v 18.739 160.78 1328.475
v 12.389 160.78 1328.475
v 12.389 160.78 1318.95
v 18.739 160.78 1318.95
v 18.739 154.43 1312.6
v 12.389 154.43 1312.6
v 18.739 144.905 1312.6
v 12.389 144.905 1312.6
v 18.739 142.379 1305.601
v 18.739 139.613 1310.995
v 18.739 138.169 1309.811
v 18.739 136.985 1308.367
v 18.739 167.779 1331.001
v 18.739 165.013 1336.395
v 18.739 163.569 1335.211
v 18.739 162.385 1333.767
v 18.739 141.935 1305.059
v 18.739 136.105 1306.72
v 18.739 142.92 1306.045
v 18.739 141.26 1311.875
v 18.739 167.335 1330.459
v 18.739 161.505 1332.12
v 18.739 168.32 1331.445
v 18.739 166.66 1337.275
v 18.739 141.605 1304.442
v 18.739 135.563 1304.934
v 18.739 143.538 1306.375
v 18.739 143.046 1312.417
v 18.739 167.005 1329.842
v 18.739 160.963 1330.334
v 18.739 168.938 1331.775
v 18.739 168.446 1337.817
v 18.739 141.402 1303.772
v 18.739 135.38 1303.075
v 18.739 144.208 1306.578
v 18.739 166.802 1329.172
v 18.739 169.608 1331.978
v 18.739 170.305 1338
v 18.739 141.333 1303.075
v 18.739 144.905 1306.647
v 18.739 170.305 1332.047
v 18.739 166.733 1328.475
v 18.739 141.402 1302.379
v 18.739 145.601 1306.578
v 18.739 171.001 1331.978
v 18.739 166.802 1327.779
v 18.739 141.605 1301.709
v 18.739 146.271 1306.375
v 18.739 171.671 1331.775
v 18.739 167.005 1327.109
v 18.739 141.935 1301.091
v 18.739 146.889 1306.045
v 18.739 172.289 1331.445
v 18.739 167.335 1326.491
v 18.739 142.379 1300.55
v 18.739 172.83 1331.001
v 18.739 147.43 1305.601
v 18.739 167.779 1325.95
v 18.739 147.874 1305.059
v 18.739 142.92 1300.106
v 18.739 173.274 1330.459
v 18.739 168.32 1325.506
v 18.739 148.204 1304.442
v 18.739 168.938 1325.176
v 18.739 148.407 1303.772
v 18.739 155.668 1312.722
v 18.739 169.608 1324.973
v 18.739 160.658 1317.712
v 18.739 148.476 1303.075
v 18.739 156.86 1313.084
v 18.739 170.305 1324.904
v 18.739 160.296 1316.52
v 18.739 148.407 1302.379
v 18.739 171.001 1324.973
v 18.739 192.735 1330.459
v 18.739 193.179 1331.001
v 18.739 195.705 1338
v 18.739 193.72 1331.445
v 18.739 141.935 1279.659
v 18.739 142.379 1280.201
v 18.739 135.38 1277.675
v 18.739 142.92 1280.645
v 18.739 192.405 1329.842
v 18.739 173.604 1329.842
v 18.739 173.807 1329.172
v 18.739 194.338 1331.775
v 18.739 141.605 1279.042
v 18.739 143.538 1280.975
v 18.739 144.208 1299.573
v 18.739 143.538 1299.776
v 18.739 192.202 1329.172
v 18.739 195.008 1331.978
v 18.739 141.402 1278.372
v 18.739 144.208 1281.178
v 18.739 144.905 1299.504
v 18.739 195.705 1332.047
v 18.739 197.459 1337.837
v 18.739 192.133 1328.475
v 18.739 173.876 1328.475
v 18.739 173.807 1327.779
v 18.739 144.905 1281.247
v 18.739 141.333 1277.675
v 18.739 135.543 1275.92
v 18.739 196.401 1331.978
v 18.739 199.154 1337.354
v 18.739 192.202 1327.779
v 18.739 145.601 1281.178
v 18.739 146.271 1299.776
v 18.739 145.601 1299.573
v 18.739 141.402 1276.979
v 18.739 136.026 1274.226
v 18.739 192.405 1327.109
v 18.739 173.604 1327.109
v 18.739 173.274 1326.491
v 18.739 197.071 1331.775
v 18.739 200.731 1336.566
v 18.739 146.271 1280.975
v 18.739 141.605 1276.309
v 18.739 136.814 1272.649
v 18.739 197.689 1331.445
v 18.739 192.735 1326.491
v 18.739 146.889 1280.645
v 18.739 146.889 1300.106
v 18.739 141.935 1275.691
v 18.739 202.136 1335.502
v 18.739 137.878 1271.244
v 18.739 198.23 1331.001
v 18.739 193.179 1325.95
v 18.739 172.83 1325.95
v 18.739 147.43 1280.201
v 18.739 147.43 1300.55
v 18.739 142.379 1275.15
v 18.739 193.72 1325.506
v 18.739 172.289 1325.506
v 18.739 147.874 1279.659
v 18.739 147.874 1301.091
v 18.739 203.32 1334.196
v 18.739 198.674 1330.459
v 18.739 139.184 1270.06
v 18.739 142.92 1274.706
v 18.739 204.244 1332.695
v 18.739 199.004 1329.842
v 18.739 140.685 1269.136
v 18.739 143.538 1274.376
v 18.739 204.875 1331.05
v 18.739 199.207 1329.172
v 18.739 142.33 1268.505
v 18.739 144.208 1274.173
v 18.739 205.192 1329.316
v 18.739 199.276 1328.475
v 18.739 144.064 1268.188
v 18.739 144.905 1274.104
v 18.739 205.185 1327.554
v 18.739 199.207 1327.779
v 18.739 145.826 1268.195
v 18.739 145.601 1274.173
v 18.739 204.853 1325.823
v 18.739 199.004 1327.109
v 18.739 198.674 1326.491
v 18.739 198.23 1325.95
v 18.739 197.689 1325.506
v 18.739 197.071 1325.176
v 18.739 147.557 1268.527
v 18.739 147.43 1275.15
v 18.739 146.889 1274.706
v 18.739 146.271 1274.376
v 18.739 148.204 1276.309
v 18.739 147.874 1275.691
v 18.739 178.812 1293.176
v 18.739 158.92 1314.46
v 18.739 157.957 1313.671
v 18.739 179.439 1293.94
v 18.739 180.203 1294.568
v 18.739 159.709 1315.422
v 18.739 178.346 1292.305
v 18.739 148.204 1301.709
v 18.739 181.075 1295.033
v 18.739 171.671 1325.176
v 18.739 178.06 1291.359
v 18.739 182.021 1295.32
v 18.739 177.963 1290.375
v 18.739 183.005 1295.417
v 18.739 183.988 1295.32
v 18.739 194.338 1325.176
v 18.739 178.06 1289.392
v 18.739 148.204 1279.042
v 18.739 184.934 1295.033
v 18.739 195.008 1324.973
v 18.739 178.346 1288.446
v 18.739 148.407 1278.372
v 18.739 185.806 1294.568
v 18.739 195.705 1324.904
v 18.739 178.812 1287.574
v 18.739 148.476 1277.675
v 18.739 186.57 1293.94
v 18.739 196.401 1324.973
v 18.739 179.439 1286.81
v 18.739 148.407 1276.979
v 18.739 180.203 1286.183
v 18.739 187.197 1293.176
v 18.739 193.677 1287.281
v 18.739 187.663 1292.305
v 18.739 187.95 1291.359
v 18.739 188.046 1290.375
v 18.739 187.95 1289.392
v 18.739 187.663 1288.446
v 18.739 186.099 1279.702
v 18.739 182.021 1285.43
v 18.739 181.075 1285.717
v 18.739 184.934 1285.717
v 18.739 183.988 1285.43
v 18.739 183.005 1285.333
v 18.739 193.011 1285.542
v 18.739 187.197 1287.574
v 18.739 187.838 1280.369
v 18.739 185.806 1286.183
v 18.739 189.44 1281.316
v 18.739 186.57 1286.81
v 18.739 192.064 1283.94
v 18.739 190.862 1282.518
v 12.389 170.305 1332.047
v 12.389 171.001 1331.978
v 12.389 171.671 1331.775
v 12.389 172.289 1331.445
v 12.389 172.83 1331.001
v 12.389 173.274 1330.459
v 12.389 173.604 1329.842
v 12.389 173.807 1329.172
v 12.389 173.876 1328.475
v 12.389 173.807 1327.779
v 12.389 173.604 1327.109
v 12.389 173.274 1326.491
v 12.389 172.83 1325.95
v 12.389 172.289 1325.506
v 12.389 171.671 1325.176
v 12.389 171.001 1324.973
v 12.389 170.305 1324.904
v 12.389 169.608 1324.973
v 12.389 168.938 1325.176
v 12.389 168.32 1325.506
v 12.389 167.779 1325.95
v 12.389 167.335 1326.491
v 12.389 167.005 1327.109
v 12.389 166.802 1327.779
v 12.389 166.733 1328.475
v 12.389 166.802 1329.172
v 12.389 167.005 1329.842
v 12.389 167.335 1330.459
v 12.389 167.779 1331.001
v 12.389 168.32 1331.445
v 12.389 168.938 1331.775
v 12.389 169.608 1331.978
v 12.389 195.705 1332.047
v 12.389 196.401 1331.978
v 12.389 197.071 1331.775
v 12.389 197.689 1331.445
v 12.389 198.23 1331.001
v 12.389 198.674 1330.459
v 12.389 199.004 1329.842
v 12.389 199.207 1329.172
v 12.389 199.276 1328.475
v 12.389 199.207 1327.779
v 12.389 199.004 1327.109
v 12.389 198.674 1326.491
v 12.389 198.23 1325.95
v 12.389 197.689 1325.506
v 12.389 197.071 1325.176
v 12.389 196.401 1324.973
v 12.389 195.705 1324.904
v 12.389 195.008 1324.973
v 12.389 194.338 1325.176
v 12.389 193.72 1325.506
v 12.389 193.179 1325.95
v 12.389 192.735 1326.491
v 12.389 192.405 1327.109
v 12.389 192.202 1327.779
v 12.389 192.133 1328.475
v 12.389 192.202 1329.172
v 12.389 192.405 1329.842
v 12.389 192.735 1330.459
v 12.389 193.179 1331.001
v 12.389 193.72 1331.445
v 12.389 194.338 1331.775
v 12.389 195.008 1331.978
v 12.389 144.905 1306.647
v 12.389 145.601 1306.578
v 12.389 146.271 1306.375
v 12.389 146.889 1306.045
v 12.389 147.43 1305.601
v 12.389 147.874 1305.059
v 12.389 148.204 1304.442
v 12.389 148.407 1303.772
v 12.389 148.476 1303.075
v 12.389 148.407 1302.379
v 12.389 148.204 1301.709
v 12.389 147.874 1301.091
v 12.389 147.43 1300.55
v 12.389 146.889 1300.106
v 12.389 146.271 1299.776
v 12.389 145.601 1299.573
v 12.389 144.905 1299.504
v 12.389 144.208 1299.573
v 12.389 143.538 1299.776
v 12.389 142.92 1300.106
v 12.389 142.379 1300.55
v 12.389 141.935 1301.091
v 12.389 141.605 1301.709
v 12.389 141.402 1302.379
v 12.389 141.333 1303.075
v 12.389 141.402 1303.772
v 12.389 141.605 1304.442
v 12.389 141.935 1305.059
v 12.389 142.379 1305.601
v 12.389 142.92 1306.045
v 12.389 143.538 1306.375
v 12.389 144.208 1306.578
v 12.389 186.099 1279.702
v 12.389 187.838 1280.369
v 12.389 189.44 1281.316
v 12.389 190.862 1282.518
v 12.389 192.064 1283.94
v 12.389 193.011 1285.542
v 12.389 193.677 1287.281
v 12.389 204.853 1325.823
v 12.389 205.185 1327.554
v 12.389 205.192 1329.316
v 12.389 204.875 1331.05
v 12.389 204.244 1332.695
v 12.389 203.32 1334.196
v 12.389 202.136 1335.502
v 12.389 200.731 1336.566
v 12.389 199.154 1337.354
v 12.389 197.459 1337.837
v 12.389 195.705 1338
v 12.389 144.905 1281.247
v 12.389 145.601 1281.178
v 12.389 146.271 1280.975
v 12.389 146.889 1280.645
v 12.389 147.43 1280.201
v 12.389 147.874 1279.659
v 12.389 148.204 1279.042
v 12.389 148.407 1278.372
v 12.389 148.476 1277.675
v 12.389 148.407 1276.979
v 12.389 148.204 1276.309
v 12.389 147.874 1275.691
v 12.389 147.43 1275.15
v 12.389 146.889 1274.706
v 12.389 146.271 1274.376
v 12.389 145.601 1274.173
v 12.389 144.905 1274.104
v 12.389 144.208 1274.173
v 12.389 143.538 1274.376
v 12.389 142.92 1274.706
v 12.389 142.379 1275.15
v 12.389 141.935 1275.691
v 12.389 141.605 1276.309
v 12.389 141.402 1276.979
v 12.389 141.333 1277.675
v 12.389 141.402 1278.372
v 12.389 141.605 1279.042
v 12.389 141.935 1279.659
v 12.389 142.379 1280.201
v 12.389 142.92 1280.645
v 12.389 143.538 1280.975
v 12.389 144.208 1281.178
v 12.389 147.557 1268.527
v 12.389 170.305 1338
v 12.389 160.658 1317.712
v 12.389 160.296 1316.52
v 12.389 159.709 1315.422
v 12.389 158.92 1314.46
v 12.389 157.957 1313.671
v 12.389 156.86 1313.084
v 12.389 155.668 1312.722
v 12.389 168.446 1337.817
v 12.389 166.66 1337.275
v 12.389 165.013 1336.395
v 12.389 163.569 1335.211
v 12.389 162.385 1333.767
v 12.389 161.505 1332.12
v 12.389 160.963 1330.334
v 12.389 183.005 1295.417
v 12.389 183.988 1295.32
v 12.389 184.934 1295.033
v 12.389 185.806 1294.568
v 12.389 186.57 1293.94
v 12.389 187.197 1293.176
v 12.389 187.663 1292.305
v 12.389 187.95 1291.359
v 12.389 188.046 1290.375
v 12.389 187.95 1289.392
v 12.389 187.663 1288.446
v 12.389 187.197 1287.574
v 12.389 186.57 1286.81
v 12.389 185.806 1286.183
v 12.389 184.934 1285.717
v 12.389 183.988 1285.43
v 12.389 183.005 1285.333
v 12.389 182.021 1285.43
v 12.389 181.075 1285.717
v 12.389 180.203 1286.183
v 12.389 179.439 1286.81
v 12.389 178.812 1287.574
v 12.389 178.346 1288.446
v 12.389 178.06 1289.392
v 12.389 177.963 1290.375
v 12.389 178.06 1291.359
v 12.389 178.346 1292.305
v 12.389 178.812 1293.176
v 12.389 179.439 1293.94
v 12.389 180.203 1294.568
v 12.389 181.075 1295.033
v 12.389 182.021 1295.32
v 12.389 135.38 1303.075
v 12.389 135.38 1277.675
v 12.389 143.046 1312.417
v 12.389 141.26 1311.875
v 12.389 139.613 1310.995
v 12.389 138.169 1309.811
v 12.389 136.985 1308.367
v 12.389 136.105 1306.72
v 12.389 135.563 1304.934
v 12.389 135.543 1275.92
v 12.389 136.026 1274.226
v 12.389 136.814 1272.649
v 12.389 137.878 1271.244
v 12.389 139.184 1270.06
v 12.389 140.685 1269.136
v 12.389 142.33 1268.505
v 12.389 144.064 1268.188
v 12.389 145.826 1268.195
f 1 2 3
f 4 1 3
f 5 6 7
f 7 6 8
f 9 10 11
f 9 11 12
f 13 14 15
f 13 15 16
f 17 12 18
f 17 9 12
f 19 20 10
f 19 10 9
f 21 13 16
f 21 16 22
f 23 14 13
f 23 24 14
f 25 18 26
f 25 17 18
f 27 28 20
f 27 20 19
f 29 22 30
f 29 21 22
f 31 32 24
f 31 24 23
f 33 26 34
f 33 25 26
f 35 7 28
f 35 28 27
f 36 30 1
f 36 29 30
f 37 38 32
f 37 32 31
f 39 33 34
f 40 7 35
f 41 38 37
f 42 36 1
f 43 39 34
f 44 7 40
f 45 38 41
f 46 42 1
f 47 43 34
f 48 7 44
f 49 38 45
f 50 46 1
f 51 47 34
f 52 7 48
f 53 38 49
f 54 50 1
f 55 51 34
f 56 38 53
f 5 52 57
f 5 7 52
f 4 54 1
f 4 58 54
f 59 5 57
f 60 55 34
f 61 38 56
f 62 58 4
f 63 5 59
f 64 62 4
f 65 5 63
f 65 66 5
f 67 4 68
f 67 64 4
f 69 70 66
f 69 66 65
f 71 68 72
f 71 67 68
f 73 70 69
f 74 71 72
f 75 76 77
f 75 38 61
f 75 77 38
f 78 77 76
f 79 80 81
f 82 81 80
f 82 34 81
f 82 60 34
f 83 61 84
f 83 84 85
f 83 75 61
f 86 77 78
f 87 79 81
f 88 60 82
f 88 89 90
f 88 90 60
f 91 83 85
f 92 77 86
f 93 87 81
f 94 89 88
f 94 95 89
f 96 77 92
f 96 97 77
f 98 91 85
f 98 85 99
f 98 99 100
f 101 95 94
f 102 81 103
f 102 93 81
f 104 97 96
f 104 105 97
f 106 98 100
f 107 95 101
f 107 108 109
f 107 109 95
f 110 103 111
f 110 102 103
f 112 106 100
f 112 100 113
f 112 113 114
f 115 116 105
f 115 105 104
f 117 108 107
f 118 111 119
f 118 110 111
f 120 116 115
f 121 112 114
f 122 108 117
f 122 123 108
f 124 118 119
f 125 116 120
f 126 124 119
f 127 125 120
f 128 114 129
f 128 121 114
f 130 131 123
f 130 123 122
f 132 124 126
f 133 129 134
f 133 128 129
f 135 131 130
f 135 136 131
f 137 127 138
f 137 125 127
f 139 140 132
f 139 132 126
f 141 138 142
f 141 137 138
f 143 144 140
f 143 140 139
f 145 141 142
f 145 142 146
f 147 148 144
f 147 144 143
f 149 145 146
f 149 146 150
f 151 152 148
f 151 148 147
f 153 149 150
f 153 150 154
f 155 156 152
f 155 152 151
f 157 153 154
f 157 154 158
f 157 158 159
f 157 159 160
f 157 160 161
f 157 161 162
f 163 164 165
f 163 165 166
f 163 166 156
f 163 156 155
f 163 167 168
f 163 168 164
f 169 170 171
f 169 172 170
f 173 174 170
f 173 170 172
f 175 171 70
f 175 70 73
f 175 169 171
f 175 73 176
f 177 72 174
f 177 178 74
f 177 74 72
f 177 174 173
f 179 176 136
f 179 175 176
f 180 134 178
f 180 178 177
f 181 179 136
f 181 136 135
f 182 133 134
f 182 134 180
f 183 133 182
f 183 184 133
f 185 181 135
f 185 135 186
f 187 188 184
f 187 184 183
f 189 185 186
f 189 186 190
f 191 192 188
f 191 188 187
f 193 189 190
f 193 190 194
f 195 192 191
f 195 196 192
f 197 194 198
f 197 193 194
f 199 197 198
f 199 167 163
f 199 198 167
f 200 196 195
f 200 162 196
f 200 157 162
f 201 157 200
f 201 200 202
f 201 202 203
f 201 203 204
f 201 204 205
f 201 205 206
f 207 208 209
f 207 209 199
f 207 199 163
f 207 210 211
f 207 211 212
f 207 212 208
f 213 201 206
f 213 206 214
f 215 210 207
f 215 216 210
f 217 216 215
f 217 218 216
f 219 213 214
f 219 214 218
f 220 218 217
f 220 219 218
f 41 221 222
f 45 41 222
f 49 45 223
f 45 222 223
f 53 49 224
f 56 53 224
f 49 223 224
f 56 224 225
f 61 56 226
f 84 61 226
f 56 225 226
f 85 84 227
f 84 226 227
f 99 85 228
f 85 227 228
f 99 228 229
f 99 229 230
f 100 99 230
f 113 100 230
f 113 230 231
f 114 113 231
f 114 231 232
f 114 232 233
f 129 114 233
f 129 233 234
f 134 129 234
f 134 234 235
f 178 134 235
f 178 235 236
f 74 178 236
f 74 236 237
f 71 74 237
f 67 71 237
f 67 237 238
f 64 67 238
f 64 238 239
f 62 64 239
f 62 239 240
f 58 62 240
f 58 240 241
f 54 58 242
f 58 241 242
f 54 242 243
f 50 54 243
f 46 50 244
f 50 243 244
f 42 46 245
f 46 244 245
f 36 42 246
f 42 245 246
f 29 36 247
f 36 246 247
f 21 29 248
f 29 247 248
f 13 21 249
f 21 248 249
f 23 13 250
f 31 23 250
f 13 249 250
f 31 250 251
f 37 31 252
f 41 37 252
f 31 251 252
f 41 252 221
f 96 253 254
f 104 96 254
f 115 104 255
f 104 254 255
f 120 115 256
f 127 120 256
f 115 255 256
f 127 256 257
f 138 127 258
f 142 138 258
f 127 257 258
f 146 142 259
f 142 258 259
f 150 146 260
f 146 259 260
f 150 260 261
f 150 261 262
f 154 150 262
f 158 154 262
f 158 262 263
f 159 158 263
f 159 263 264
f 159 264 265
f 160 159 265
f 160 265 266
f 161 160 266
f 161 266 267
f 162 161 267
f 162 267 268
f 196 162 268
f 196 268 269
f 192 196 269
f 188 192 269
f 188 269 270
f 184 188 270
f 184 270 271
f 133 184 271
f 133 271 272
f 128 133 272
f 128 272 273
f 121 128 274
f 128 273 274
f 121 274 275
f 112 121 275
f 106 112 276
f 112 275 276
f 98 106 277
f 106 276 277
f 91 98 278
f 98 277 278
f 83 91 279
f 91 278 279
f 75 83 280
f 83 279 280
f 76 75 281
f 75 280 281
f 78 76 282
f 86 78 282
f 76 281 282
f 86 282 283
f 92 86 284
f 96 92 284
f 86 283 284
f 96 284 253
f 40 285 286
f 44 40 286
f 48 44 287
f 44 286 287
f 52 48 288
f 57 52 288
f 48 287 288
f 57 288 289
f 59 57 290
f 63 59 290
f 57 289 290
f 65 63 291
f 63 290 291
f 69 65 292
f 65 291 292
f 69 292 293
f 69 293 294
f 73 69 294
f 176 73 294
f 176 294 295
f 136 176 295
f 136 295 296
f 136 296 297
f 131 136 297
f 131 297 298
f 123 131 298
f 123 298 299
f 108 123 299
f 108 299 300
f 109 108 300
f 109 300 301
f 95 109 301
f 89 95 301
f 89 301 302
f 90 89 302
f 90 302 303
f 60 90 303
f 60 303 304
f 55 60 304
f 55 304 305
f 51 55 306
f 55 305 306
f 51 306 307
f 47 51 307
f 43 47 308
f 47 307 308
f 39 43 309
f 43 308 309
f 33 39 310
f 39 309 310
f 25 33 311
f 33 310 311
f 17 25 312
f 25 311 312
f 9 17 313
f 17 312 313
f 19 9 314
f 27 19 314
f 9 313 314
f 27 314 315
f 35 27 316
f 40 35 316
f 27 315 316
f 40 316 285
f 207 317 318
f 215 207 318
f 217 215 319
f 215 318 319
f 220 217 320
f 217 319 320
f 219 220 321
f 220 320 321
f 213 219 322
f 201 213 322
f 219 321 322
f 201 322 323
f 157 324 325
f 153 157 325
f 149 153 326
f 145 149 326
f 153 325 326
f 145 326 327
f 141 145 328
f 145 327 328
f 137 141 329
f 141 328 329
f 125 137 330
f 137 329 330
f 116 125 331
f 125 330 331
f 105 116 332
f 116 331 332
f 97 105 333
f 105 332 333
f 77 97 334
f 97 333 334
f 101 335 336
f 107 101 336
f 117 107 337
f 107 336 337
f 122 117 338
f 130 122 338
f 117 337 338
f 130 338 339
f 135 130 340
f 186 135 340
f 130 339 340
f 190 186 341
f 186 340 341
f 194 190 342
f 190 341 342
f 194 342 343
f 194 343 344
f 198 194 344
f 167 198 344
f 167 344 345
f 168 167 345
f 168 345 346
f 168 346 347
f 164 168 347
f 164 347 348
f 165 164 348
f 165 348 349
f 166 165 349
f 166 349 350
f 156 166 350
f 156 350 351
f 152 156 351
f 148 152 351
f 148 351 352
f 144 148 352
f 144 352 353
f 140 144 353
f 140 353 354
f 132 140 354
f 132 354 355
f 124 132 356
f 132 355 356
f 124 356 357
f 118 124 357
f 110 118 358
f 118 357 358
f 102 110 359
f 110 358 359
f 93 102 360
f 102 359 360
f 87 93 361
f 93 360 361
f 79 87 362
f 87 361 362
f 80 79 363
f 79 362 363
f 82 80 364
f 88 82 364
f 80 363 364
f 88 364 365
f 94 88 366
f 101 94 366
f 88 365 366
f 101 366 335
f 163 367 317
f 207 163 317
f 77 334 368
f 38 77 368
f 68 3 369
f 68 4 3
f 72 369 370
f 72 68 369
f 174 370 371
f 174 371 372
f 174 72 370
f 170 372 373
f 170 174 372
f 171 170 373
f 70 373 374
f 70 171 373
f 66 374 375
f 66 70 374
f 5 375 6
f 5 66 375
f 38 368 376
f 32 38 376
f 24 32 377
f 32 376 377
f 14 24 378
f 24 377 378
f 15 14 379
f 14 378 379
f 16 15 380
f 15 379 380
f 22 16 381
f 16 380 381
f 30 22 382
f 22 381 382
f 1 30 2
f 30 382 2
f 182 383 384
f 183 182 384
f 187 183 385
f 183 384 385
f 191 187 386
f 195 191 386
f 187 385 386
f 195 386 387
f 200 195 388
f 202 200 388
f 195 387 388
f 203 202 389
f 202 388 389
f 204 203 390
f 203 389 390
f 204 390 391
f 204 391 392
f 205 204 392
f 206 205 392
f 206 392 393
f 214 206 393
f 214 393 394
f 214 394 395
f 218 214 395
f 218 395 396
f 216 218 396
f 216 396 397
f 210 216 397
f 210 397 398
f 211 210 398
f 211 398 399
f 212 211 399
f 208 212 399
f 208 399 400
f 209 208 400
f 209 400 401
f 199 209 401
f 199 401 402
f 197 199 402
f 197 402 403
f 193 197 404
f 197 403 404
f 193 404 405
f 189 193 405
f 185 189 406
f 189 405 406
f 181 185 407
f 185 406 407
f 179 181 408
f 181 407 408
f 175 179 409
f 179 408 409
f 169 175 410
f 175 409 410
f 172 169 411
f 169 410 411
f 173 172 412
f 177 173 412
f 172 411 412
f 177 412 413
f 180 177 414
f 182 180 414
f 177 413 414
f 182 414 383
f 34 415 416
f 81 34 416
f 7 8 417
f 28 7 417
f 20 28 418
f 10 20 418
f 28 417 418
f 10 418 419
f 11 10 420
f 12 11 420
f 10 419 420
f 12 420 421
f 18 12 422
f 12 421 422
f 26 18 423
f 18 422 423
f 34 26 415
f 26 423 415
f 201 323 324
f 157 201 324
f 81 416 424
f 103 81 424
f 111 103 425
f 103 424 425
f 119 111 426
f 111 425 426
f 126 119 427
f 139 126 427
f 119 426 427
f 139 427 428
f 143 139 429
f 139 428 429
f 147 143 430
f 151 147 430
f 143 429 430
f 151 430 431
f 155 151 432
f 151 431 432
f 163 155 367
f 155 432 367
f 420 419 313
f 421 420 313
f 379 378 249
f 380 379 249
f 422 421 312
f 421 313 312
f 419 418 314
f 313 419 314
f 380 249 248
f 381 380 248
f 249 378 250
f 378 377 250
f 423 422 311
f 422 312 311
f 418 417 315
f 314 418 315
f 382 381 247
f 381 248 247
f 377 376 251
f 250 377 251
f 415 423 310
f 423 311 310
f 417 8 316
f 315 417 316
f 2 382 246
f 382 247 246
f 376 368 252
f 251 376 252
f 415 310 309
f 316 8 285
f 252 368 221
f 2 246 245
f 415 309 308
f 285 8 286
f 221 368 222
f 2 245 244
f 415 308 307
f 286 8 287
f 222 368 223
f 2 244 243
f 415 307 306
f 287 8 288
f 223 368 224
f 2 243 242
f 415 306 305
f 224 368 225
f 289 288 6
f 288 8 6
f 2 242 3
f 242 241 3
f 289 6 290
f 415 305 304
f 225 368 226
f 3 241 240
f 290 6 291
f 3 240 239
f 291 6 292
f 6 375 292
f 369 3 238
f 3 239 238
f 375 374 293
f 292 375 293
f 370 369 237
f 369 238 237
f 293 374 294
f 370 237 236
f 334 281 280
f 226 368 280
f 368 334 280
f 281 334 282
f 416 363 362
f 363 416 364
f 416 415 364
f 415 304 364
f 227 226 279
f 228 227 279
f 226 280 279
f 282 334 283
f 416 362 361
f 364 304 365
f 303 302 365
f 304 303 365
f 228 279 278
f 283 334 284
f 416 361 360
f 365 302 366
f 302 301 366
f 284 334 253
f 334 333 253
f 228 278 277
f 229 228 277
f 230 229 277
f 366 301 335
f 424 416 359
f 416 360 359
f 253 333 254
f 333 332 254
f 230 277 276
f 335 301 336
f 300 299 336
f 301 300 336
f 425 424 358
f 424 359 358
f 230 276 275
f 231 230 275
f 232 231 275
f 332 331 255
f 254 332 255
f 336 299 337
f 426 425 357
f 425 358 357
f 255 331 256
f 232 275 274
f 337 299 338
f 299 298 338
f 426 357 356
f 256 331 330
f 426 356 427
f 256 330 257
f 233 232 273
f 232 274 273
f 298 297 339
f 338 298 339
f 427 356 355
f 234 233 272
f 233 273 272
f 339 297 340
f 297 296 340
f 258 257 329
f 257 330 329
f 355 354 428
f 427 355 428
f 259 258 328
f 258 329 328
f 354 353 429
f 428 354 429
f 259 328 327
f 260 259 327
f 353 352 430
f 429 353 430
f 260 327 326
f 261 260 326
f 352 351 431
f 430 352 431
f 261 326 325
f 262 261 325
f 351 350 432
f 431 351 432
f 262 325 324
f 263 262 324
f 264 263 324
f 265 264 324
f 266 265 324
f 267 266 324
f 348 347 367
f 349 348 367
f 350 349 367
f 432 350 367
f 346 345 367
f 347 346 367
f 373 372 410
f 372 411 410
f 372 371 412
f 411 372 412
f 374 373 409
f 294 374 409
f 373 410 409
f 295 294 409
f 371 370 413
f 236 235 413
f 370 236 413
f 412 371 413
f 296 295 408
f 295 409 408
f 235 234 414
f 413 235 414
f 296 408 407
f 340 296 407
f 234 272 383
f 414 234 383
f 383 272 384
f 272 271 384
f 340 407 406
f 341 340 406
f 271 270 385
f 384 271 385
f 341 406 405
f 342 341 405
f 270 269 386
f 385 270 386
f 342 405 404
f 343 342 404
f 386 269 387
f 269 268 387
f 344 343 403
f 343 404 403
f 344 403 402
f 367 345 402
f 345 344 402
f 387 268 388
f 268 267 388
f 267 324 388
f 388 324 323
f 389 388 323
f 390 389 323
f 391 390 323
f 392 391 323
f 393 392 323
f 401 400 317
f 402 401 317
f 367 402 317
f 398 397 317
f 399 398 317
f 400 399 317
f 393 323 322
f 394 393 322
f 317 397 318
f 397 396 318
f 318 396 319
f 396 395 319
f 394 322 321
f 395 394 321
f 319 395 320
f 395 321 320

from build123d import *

# Parameters (mm, degrees)
BOSS_EXTRUDE1_START     = 12.388912
BOSS_EXTRUDE1_DEPTH     = 6.35
F_3_8_CLEARANCE_HOLE1_D = 10.0838
F_1_4_CLEARANCE_HOLE1_D = 7.14248
FILLET1_R               = 6.35


with BuildPart() as part:
    # Sketch1 → Boss-Extrude1 (new body)
    with BuildSketch(Plane(origin=(0, 0, 0), x_dir=(0, 0, -1), z_dir=(1, 0, 0)).offset(BOSS_EXTRUDE1_START)):
        with BuildLine():
            Line((-1338.000334154, 195.704574554), (-1338.000334154, 170.304574554))
            ThreePointArc((-1338.000334154, 170.304574554), (-1335.210526245, 163.569382463), (-1328.475334154, 160.779574554))
            Line((-1328.475334154, 160.779574554), (-1312.600334154, 160.779574554))
            Line((-1312.600334154, 160.779574554), (-1312.600334154, 144.904574554))
            ThreePointArc((-1312.600334154, 144.904574554), (-1309.810526245, 138.169382463), (-1303.075334154, 135.379574554))
            Line((-1303.075334154, 135.379574554), (-1277.675334154, 135.379574554))
            ThreePointArc((-1277.675334154, 135.379574554), (-1270.059858037, 139.183547679), (-1268.527125538, 147.557102426))
            Line((-1268.527125538, 147.557102426), (-1279.702424102, 186.099190405))
            ThreePointArc((-1279.702424102, 186.099190405), (-1282.517610048, 190.86229866), (-1287.280718303, 193.677484606))
            Line((-1287.280718303, 193.677484606), (-1325.822806282, 204.85278317))
            ThreePointArc((-1325.822806282, 204.85278317), (-1334.196361029, 203.320050671), (-1338.000334154, 195.704574554))
        make_face()
    extrude(amount=BOSS_EXTRUDE1_DEPTH)

    # 3/8 Clearance Hole1 (through all)
    with Locations(Plane(origin=(18.738912484, 0, 0), x_dir=(0, 0, -1), z_dir=(1, 0, 0))):
        with Locations((-1290.375334154, 183.004574554)):
            Hole(F_3_8_CLEARANCE_HOLE1_D / 2)

    # 1/4 Clearance Hole1 (through all)
    with Locations(Plane(origin=(18.738912484, 0, 0), x_dir=(0, 0, -1), z_dir=(1, 0, 0))):
        with Locations((-1303.075334154, 144.904574554), (-1277.675334154, 144.904574554), (-1328.475334154, 170.304574554), (-1328.475334154, 195.704574554)):
            Hole(F_1_4_CLEARANCE_HOLE1_D / 2)

    # Fillet1
    fillet1_edges = [part.edges().sort_by_distance(p)[0] for p in [
        (15.563912, 160.779574554, 1312.600334154),
    ]]
    fillet(fillet1_edges, radius=FILLET1_R)


solid = part.part
